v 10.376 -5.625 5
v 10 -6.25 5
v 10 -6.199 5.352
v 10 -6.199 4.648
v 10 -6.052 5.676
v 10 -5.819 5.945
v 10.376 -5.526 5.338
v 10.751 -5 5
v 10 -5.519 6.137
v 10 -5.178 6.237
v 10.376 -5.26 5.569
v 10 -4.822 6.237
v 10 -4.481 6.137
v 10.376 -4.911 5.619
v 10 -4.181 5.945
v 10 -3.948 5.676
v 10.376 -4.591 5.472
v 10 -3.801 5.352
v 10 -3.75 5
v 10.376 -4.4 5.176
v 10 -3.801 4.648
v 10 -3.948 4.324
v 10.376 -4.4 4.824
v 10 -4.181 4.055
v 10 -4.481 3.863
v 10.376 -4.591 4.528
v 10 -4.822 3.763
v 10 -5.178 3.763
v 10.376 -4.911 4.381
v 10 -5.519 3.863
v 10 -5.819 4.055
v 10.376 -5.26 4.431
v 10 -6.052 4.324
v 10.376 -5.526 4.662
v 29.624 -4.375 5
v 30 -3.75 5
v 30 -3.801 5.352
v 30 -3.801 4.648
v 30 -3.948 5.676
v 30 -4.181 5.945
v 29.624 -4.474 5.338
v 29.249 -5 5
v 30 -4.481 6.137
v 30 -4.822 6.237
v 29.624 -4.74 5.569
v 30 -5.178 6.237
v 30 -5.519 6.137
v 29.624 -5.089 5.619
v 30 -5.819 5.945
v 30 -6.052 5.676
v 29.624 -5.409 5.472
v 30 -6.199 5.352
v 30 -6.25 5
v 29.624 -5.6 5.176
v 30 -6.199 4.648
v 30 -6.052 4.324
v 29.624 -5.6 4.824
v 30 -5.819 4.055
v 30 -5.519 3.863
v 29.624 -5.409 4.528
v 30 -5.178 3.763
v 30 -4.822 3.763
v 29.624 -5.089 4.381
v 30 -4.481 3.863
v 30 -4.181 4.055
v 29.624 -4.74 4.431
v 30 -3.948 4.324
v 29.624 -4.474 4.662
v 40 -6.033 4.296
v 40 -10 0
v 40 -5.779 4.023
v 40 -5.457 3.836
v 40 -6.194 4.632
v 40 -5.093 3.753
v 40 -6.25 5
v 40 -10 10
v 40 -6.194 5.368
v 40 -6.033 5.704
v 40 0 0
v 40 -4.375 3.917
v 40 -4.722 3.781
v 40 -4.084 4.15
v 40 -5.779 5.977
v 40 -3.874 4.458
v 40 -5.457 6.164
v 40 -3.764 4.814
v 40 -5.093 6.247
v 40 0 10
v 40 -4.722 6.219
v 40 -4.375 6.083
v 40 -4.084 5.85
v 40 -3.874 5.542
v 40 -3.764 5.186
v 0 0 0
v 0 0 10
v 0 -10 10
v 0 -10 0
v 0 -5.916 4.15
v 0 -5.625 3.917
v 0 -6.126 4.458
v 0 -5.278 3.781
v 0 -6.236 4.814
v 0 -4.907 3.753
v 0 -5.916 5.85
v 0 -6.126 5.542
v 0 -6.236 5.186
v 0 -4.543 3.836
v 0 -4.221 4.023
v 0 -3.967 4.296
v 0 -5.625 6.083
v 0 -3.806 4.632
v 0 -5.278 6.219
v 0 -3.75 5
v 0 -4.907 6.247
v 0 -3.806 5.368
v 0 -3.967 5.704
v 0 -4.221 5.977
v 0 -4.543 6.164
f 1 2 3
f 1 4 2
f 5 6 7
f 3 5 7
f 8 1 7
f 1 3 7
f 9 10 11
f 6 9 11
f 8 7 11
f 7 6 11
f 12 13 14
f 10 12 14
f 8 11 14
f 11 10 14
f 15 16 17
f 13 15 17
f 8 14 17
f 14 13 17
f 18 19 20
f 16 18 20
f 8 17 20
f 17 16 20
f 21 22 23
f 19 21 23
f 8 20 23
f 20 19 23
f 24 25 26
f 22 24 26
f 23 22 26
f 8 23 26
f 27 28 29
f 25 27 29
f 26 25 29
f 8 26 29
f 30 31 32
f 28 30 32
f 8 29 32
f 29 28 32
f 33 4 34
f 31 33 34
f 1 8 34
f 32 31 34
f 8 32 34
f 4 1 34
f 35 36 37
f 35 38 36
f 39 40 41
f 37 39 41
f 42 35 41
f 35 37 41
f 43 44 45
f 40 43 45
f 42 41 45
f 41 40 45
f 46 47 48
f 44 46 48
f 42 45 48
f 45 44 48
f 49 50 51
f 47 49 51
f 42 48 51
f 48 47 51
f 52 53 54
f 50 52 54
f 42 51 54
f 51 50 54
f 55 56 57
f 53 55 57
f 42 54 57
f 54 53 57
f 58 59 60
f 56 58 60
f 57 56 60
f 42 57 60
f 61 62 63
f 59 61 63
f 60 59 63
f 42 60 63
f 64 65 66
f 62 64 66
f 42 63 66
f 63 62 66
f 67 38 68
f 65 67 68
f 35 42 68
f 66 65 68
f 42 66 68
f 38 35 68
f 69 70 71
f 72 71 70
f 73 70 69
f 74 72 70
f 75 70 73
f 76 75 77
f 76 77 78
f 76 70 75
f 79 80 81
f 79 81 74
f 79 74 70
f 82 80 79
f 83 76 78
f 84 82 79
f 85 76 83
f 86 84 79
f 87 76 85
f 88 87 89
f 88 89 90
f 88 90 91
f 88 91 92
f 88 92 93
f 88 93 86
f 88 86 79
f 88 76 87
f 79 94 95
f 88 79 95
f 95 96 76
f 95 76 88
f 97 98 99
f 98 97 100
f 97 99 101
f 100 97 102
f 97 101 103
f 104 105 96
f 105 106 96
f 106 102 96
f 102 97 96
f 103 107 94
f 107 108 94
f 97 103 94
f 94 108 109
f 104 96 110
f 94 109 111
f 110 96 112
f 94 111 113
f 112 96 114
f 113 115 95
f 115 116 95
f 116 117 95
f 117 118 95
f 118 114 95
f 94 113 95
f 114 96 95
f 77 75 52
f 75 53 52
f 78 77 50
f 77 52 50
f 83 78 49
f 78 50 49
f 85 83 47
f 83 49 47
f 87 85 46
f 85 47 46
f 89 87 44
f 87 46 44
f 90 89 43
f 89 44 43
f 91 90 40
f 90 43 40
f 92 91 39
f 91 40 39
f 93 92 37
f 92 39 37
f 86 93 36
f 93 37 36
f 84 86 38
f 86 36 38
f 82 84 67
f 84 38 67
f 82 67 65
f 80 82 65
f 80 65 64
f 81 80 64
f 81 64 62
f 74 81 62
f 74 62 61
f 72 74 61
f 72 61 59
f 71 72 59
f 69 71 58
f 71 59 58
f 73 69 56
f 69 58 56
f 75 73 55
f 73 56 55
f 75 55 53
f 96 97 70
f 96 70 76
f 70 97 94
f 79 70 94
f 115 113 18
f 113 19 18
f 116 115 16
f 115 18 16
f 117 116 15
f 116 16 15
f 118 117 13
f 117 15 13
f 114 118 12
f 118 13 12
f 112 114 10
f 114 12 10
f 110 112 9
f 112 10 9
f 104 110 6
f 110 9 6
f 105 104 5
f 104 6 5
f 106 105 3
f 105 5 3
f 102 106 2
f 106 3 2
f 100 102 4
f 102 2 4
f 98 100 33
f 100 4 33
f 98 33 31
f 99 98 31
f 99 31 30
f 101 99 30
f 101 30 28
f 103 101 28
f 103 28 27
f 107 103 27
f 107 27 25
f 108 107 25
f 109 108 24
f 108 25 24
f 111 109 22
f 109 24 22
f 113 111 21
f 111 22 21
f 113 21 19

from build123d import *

# Parameters (mm, degrees)
F0_W     = 10
F0_H     = 10
F1_DEPTH = 40
F3_D     = 2.5
F3_DEPTH = 10
F3_TIP   = 0.7510757738
F5_D     = 2.5
F5_DEPTH = 10
F5_TIP   = 0.7510757738


with BuildPart() as f1:
    # F0 (on Right) → F1 (new body)
    with BuildSketch(Plane.YZ):
        with Locations((-5, 5)):
            Rectangle(F0_W, F0_H)
    extrude(amount=F1_DEPTH)

    # F3
    with Locations(Plane.YZ.offset(40)):
        with Locations((-5, 5)):
            Hole(F3_D / 2, depth=F3_DEPTH)
            with Locations((0, 0, -(F3_DEPTH + F3_TIP / 2))):  # 118° drill point
                Cone(0, F3_D / 2, F3_TIP, mode=Mode.SUBTRACT)

    # F5
    with Locations(Plane(origin=(0, 0, 0), x_dir=(0, -1, 0), z_dir=(-1, 0, 0))):
        with Locations((5, 5)):
            Hole(F5_D / 2, depth=F5_DEPTH)
            with Locations((0, 0, -(F5_DEPTH + F5_TIP / 2))):  # 118° drill point
                Cone(0, F5_D / 2, F5_TIP, mode=Mode.SUBTRACT)


solid = f1.part
